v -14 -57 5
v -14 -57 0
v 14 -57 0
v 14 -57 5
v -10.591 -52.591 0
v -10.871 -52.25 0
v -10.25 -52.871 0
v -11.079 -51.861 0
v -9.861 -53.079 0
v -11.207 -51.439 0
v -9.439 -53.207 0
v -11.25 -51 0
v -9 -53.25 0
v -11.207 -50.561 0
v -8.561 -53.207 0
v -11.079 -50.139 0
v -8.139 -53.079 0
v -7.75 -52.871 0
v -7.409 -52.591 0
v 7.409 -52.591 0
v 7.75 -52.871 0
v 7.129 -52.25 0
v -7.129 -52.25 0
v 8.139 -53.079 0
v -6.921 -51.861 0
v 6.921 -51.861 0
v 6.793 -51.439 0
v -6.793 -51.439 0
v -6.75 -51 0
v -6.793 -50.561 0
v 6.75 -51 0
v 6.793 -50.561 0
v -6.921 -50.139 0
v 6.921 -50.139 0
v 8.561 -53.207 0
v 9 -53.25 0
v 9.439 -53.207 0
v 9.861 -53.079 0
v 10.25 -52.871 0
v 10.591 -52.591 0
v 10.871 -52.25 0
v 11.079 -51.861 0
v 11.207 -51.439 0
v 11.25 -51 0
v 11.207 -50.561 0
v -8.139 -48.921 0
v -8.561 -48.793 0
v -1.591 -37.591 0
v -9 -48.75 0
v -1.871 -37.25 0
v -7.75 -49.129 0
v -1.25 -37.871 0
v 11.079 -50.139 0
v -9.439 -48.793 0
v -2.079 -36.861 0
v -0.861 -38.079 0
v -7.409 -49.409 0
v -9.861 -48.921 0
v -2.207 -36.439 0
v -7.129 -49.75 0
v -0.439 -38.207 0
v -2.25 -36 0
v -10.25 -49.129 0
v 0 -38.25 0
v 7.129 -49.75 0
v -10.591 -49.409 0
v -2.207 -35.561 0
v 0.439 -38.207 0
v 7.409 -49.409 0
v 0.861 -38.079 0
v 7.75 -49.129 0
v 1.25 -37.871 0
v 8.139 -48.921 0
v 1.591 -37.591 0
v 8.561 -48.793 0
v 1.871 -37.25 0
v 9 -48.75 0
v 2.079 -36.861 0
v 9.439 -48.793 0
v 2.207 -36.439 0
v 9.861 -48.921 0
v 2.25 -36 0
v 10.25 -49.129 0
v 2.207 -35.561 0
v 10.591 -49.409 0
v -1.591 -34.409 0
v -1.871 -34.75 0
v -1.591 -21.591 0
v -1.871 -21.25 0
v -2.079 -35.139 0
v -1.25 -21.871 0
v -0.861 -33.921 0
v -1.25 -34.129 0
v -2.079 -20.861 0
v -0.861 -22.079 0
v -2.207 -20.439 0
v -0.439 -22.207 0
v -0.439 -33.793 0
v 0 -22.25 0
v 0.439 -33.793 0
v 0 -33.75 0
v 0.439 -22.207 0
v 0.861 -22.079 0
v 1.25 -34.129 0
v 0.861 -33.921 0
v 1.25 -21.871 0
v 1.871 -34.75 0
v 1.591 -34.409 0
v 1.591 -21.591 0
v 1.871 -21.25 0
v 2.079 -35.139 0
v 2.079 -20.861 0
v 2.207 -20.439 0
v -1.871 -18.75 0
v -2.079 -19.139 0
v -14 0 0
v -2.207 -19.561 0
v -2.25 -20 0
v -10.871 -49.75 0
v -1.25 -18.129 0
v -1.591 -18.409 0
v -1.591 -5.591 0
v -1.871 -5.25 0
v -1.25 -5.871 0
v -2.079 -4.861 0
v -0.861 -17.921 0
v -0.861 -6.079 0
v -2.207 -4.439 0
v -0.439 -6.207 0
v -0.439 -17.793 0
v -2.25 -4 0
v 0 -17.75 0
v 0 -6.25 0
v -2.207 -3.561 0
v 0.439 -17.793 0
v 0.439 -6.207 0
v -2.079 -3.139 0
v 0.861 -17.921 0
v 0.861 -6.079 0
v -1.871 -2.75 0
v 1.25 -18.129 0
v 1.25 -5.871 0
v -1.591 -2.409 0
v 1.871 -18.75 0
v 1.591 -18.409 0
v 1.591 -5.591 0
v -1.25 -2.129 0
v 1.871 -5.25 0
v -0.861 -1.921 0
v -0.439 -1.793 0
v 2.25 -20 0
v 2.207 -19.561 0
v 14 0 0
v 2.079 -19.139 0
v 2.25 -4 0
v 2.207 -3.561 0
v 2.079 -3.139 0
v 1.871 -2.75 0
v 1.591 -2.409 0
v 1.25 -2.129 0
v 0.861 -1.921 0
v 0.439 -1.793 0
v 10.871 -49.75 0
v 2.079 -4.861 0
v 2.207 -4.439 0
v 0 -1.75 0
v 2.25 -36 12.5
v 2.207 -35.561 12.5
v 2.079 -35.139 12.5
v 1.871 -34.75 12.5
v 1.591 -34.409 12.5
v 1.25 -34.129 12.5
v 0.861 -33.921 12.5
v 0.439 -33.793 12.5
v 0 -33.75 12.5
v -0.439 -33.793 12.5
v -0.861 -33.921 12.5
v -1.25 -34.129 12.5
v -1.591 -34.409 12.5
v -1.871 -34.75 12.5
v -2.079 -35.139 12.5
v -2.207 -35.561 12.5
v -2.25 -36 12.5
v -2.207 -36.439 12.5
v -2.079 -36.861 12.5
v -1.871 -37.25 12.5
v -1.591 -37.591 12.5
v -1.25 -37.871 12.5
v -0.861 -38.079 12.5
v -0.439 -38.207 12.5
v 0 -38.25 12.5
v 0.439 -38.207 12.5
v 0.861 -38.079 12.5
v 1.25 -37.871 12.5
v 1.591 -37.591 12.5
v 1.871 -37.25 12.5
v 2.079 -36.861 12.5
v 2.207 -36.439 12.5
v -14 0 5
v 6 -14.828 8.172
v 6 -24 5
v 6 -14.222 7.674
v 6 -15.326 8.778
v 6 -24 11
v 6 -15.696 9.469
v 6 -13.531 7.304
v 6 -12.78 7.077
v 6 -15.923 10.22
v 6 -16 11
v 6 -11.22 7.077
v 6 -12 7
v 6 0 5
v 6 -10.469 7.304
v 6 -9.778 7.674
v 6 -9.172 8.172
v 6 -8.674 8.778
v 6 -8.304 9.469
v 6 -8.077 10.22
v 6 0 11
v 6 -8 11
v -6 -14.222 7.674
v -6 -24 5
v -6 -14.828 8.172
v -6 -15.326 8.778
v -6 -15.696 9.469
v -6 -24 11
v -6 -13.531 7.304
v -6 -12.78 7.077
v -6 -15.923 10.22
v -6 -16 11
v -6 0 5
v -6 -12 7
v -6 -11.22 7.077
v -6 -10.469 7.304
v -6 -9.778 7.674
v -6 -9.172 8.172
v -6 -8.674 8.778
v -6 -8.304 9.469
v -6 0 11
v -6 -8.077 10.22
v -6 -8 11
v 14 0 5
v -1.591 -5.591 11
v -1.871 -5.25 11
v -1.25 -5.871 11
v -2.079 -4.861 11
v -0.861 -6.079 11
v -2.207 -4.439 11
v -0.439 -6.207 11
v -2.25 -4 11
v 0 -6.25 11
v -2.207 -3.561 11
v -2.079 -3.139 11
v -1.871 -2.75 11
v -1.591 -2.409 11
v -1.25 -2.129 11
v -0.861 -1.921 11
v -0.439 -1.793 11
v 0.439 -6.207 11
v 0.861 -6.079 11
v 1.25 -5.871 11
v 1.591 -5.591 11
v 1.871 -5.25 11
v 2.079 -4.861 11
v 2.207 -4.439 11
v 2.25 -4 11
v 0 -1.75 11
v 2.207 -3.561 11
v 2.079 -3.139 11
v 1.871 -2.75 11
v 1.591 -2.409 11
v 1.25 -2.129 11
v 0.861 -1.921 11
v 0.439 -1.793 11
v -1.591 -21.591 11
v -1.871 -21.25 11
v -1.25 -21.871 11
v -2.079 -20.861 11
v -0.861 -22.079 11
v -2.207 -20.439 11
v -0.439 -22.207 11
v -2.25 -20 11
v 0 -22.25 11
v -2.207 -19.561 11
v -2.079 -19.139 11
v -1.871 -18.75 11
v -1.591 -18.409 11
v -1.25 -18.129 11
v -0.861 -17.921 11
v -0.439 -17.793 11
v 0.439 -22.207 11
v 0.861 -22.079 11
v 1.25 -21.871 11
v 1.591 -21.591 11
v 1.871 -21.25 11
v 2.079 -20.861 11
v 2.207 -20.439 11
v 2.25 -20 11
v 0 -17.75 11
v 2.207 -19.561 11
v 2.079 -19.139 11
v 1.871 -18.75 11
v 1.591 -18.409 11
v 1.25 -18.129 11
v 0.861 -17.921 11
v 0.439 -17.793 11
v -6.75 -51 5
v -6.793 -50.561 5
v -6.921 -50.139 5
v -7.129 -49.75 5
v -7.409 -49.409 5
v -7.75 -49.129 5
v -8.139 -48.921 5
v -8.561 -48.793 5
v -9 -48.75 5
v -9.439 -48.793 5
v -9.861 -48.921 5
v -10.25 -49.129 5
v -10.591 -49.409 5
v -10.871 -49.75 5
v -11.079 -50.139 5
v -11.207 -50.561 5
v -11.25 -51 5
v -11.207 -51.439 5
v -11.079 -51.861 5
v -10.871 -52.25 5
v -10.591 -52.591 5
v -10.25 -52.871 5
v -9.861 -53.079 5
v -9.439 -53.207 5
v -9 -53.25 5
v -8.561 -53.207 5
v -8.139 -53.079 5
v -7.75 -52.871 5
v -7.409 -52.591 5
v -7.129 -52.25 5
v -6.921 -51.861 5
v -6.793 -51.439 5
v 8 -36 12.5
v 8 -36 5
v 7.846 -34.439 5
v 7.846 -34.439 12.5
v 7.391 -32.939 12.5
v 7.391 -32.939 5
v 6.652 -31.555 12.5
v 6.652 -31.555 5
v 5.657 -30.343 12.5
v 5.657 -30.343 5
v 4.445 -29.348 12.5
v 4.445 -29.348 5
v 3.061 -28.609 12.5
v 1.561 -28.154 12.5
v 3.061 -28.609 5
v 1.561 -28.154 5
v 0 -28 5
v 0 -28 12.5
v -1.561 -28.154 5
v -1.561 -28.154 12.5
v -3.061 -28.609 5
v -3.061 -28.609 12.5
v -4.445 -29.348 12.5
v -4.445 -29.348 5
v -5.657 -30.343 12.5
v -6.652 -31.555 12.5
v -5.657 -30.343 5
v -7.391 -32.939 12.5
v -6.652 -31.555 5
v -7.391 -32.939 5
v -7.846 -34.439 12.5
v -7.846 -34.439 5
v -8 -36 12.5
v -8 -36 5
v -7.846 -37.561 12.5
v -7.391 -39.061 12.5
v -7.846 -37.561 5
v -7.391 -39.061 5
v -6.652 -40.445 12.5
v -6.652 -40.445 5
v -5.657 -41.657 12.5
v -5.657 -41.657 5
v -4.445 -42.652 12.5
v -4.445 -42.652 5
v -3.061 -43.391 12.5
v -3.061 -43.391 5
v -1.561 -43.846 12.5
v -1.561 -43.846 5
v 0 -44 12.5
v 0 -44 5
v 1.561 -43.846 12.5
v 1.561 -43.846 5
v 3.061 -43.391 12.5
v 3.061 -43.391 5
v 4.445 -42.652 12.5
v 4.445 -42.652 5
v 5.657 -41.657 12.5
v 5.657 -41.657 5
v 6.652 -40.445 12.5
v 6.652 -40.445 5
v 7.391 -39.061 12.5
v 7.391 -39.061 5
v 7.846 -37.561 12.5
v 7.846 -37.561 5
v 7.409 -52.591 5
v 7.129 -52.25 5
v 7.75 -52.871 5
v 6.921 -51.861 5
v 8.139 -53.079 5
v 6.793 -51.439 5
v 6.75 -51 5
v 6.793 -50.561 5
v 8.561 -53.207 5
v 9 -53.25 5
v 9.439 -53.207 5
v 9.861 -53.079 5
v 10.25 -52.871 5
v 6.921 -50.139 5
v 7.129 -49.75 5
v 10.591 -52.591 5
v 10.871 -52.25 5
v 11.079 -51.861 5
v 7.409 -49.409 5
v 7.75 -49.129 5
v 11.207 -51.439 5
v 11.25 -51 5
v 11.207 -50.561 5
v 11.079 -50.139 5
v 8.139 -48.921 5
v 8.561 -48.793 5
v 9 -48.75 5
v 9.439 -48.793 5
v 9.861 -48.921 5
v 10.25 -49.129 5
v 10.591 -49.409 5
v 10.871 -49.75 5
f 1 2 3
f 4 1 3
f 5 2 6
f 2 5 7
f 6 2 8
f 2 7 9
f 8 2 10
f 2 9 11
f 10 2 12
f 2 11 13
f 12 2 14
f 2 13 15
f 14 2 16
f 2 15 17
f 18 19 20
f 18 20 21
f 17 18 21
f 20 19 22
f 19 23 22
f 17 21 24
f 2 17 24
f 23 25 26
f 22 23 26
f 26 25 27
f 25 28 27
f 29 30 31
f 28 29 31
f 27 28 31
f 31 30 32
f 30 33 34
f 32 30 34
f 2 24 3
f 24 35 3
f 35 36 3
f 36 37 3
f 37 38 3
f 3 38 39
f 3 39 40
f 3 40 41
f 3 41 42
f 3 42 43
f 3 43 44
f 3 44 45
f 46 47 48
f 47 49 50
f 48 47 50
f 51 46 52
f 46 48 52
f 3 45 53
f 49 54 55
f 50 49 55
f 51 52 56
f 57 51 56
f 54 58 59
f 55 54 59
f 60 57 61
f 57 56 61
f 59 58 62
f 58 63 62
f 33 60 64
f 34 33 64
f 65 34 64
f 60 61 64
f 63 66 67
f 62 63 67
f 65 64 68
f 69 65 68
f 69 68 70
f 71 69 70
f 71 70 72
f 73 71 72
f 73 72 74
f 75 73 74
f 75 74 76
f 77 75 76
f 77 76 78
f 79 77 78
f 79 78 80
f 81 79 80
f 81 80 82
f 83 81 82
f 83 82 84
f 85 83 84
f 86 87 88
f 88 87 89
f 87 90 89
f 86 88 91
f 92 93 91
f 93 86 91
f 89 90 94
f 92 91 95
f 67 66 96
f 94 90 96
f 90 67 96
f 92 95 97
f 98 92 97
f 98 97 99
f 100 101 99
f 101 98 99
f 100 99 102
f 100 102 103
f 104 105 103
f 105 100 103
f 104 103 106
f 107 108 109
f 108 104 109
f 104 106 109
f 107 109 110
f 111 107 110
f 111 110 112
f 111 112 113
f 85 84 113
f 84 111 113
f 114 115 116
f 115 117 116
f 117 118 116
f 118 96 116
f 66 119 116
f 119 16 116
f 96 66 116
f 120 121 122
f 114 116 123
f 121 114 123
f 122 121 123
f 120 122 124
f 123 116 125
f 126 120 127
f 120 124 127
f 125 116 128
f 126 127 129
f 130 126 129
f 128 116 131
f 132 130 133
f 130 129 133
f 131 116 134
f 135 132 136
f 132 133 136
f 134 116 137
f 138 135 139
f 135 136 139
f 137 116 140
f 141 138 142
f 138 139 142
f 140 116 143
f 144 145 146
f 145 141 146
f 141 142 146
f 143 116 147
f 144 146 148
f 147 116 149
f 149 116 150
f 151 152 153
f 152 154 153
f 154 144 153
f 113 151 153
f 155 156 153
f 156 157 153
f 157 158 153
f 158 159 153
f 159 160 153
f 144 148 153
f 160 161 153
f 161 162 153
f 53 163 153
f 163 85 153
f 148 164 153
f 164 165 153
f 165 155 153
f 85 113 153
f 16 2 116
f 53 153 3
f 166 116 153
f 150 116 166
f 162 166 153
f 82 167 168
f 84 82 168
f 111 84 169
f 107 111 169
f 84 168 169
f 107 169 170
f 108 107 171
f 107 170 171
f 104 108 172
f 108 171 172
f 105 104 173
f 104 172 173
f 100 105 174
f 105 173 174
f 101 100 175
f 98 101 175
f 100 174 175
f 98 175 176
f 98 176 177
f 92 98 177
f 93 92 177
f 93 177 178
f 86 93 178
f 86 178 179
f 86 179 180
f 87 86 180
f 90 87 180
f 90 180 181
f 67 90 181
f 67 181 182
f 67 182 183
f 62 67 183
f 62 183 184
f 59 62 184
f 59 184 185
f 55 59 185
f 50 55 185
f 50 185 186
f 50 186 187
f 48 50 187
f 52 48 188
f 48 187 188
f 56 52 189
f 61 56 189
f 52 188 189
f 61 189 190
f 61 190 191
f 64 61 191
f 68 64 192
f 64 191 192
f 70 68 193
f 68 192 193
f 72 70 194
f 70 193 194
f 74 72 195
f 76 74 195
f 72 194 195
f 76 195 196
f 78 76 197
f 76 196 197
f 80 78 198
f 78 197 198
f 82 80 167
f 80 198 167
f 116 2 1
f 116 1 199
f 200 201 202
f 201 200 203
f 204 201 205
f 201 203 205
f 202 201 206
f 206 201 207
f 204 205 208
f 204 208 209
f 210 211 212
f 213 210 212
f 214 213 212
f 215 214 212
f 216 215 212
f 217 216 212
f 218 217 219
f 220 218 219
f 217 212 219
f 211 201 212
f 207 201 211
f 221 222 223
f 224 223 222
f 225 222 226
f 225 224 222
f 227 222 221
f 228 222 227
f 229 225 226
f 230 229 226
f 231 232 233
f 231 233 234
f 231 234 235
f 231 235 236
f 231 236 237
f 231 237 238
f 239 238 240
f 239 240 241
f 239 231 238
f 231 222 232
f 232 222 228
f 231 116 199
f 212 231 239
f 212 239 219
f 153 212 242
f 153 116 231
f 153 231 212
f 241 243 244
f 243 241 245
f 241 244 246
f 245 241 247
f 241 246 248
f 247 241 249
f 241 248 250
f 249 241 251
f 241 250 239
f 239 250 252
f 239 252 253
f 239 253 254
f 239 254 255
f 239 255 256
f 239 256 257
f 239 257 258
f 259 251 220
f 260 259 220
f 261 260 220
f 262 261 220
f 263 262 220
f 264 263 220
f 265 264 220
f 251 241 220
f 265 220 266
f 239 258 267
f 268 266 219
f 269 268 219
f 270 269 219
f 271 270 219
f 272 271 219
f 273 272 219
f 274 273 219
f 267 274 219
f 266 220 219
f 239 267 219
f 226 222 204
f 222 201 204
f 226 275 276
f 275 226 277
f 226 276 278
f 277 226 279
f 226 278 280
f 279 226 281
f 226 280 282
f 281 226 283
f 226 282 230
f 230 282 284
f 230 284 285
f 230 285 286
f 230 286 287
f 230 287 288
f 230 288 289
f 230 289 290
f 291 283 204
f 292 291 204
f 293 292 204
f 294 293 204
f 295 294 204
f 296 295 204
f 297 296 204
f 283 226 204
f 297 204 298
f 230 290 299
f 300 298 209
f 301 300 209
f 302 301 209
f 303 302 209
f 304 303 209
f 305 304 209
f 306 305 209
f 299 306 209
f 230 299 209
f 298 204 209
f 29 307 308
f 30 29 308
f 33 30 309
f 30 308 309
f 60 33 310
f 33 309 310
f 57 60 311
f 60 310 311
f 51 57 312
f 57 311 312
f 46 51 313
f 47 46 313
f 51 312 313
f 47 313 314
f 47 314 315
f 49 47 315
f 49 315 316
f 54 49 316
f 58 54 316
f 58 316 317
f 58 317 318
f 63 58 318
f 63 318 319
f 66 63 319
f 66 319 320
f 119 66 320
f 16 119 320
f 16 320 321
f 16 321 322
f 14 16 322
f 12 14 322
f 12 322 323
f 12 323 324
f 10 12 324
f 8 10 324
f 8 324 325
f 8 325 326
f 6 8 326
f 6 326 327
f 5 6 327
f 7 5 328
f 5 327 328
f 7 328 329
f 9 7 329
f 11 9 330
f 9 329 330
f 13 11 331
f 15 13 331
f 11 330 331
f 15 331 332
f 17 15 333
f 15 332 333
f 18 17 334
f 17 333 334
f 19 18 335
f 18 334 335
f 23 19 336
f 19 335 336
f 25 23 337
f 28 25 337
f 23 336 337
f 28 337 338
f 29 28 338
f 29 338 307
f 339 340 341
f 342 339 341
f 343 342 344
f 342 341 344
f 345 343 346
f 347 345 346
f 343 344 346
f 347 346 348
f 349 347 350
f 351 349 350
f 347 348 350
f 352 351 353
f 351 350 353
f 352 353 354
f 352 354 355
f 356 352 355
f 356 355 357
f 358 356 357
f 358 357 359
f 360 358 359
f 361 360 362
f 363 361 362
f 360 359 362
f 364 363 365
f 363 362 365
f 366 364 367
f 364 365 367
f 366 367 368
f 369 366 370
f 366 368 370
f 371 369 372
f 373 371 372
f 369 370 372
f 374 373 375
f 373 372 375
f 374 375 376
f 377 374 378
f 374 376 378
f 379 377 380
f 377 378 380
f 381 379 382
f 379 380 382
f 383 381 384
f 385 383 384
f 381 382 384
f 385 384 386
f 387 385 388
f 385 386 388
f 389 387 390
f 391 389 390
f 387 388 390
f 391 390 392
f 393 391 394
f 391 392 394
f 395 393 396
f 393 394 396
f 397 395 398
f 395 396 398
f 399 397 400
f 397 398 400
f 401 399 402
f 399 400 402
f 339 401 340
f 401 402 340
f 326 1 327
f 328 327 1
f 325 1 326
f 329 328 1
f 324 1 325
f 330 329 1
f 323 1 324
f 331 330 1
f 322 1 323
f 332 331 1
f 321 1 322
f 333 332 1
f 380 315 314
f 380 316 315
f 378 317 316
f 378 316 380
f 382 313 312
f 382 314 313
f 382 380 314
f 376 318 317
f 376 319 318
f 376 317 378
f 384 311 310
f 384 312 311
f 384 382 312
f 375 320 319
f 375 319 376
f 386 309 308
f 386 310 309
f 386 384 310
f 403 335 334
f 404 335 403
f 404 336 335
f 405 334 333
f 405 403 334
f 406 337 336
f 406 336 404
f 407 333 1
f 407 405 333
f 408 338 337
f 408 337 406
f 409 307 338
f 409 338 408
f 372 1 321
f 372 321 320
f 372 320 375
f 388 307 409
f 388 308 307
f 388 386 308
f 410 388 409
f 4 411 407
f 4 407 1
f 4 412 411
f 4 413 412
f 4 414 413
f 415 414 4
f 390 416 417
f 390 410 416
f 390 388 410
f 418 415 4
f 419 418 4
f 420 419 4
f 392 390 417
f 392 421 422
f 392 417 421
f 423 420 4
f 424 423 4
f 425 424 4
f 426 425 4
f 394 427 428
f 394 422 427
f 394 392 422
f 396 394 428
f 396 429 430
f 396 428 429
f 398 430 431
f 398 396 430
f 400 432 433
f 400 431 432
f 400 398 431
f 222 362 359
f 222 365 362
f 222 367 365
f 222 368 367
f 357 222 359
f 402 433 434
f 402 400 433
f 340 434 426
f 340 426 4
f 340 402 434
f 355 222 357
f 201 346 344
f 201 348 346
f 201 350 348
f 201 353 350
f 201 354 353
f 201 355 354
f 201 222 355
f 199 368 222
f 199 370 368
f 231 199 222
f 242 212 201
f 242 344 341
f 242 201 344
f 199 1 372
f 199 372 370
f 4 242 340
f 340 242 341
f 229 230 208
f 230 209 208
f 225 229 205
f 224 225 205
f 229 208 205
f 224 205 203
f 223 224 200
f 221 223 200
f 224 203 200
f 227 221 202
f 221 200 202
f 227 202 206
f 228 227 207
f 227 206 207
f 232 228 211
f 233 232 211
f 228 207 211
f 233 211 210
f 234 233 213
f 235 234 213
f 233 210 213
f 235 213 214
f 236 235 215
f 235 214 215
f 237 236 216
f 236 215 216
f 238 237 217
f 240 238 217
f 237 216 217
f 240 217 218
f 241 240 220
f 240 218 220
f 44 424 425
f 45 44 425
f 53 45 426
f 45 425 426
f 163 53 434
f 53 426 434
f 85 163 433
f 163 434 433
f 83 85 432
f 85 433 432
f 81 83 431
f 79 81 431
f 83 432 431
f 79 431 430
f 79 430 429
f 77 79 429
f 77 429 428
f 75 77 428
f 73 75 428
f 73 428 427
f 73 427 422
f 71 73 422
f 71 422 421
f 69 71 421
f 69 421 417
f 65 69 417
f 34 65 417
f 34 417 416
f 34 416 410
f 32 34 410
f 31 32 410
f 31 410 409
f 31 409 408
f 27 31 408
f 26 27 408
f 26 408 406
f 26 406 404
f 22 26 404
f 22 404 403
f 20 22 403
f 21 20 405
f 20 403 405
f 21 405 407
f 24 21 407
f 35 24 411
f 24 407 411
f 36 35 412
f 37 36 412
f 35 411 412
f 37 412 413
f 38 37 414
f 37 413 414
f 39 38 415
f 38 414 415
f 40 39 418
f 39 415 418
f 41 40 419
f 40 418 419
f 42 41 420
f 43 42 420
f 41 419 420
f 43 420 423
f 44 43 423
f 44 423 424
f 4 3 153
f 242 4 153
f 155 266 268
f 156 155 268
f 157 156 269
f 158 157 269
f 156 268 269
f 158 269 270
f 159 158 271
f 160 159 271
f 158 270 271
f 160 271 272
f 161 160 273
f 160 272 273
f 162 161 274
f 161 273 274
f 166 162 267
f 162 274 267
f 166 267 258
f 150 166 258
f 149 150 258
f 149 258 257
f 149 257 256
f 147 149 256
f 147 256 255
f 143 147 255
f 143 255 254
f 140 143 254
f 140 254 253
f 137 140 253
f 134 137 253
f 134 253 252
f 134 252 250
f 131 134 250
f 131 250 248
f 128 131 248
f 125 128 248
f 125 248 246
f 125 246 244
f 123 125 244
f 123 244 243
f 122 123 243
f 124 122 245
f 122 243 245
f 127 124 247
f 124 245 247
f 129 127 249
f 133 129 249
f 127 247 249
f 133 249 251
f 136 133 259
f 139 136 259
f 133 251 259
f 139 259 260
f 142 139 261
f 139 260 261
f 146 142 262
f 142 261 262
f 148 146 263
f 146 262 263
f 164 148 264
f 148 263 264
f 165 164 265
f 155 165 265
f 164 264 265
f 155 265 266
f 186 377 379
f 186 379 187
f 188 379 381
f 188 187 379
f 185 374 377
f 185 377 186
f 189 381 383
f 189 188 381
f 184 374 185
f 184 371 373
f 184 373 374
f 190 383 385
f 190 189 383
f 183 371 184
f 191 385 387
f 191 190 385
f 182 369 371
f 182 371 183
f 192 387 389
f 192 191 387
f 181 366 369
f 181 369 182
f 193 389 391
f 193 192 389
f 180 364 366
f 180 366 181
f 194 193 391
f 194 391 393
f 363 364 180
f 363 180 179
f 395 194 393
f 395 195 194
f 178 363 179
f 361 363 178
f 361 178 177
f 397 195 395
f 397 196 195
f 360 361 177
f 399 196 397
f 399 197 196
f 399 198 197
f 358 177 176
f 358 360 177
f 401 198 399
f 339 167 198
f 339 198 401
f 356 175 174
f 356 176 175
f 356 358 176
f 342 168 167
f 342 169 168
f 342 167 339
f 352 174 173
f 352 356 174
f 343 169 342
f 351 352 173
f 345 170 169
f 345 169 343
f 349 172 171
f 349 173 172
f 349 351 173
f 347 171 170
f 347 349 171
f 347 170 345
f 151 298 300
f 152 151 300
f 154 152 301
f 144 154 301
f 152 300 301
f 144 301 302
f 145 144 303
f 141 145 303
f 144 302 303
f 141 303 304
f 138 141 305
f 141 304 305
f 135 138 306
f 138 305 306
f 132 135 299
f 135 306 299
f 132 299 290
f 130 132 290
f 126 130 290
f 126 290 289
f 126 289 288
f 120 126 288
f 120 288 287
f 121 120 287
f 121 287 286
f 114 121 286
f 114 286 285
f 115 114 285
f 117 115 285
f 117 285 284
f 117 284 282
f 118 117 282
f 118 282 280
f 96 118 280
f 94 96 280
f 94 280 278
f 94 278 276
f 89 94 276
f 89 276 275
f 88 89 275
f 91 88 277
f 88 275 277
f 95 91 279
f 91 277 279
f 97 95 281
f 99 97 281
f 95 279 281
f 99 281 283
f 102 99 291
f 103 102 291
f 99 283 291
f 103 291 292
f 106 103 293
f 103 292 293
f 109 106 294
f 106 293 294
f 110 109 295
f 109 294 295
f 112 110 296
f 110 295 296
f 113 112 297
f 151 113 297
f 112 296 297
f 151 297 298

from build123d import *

# Parameters (mm, degrees)
SKETCH1_W           = 28
SKETCH1_H           = 57
BOSS_EXTRUDE1_DEPTH = 5
BOSS_EXTRUDE2_DEPTH = 6
SKETCH3_R           = 2.25
CUT_EXTRUDE1_DEPTH  = 60.715994507
SKETCH4_R           = 2.25
CUT_EXTRUDE2_DEPTH  = 60
SKETCH5_R           = 8
BOSS_EXTRUDE3_DEPTH = 7.5
SKETCH6_R           = 2.25
CUT_EXTRUDE3_DEPTH  = 61.010415763


with BuildPart() as part:
    # Sketch1 → Boss-Extrude1 (new body)
    with BuildSketch(Plane.XY):
        with Locations((0, -28.5)):
            Rectangle(SKETCH1_W, SKETCH1_H)
    extrude(amount=BOSS_EXTRUDE1_DEPTH)

    # Sketch2 → Boss-Extrude2 (add, symmetric)
    with BuildSketch(Plane(origin=(0, 0, 0), x_dir=(0, 0, -1), z_dir=(1, 0, 0))):
        with BuildLine():
            Line((-5, 0), (-5, -24))
            Line((-5, -24), (-11, -24))
            Line((-11, -24), (-11, -16))
            ThreePointArc((-11, -16), (-7, -12), (-11, -8))
            Line((-11, -8), (-11, 0))
            Line((-11, 0), (-5, 0))
        make_face()
    extrude(amount=BOSS_EXTRUDE2_DEPTH, both=True)

    # Sketch3 → Cut-Extrude1 (cut, through all)
    with BuildSketch(Plane.XY.offset(11)):
        with Locations((0, -4)):
            Circle(SKETCH3_R)
        with Locations((0, -20)):
            Circle(SKETCH3_R)
    extrude(amount=-CUT_EXTRUDE1_DEPTH, mode=Mode.SUBTRACT)

    # Sketch4 → Cut-Extrude2 (cut, through all)
    with BuildSketch(Plane.XY.offset(5)):
        with Locations((-9, -51)):
            Circle(SKETCH4_R)
        with Locations((9, -51)):
            Circle(SKETCH4_R)
    extrude(amount=-CUT_EXTRUDE2_DEPTH, mode=Mode.SUBTRACT)

    # Sketch5 → Boss-Extrude3 (add)
    with BuildSketch(Plane.XY.offset(5)):
        with Locations((0, -36)):
            Circle(SKETCH5_R)
    extrude(amount=BOSS_EXTRUDE3_DEPTH)

    # Sketch6 → Cut-Extrude3 (cut, through all)
    with BuildSketch(Plane.XY.offset(12.5)):
        with Locations((0, -36)):
            Circle(SKETCH6_R)
    extrude(amount=-CUT_EXTRUDE3_DEPTH, mode=Mode.SUBTRACT)


solid = part.part
